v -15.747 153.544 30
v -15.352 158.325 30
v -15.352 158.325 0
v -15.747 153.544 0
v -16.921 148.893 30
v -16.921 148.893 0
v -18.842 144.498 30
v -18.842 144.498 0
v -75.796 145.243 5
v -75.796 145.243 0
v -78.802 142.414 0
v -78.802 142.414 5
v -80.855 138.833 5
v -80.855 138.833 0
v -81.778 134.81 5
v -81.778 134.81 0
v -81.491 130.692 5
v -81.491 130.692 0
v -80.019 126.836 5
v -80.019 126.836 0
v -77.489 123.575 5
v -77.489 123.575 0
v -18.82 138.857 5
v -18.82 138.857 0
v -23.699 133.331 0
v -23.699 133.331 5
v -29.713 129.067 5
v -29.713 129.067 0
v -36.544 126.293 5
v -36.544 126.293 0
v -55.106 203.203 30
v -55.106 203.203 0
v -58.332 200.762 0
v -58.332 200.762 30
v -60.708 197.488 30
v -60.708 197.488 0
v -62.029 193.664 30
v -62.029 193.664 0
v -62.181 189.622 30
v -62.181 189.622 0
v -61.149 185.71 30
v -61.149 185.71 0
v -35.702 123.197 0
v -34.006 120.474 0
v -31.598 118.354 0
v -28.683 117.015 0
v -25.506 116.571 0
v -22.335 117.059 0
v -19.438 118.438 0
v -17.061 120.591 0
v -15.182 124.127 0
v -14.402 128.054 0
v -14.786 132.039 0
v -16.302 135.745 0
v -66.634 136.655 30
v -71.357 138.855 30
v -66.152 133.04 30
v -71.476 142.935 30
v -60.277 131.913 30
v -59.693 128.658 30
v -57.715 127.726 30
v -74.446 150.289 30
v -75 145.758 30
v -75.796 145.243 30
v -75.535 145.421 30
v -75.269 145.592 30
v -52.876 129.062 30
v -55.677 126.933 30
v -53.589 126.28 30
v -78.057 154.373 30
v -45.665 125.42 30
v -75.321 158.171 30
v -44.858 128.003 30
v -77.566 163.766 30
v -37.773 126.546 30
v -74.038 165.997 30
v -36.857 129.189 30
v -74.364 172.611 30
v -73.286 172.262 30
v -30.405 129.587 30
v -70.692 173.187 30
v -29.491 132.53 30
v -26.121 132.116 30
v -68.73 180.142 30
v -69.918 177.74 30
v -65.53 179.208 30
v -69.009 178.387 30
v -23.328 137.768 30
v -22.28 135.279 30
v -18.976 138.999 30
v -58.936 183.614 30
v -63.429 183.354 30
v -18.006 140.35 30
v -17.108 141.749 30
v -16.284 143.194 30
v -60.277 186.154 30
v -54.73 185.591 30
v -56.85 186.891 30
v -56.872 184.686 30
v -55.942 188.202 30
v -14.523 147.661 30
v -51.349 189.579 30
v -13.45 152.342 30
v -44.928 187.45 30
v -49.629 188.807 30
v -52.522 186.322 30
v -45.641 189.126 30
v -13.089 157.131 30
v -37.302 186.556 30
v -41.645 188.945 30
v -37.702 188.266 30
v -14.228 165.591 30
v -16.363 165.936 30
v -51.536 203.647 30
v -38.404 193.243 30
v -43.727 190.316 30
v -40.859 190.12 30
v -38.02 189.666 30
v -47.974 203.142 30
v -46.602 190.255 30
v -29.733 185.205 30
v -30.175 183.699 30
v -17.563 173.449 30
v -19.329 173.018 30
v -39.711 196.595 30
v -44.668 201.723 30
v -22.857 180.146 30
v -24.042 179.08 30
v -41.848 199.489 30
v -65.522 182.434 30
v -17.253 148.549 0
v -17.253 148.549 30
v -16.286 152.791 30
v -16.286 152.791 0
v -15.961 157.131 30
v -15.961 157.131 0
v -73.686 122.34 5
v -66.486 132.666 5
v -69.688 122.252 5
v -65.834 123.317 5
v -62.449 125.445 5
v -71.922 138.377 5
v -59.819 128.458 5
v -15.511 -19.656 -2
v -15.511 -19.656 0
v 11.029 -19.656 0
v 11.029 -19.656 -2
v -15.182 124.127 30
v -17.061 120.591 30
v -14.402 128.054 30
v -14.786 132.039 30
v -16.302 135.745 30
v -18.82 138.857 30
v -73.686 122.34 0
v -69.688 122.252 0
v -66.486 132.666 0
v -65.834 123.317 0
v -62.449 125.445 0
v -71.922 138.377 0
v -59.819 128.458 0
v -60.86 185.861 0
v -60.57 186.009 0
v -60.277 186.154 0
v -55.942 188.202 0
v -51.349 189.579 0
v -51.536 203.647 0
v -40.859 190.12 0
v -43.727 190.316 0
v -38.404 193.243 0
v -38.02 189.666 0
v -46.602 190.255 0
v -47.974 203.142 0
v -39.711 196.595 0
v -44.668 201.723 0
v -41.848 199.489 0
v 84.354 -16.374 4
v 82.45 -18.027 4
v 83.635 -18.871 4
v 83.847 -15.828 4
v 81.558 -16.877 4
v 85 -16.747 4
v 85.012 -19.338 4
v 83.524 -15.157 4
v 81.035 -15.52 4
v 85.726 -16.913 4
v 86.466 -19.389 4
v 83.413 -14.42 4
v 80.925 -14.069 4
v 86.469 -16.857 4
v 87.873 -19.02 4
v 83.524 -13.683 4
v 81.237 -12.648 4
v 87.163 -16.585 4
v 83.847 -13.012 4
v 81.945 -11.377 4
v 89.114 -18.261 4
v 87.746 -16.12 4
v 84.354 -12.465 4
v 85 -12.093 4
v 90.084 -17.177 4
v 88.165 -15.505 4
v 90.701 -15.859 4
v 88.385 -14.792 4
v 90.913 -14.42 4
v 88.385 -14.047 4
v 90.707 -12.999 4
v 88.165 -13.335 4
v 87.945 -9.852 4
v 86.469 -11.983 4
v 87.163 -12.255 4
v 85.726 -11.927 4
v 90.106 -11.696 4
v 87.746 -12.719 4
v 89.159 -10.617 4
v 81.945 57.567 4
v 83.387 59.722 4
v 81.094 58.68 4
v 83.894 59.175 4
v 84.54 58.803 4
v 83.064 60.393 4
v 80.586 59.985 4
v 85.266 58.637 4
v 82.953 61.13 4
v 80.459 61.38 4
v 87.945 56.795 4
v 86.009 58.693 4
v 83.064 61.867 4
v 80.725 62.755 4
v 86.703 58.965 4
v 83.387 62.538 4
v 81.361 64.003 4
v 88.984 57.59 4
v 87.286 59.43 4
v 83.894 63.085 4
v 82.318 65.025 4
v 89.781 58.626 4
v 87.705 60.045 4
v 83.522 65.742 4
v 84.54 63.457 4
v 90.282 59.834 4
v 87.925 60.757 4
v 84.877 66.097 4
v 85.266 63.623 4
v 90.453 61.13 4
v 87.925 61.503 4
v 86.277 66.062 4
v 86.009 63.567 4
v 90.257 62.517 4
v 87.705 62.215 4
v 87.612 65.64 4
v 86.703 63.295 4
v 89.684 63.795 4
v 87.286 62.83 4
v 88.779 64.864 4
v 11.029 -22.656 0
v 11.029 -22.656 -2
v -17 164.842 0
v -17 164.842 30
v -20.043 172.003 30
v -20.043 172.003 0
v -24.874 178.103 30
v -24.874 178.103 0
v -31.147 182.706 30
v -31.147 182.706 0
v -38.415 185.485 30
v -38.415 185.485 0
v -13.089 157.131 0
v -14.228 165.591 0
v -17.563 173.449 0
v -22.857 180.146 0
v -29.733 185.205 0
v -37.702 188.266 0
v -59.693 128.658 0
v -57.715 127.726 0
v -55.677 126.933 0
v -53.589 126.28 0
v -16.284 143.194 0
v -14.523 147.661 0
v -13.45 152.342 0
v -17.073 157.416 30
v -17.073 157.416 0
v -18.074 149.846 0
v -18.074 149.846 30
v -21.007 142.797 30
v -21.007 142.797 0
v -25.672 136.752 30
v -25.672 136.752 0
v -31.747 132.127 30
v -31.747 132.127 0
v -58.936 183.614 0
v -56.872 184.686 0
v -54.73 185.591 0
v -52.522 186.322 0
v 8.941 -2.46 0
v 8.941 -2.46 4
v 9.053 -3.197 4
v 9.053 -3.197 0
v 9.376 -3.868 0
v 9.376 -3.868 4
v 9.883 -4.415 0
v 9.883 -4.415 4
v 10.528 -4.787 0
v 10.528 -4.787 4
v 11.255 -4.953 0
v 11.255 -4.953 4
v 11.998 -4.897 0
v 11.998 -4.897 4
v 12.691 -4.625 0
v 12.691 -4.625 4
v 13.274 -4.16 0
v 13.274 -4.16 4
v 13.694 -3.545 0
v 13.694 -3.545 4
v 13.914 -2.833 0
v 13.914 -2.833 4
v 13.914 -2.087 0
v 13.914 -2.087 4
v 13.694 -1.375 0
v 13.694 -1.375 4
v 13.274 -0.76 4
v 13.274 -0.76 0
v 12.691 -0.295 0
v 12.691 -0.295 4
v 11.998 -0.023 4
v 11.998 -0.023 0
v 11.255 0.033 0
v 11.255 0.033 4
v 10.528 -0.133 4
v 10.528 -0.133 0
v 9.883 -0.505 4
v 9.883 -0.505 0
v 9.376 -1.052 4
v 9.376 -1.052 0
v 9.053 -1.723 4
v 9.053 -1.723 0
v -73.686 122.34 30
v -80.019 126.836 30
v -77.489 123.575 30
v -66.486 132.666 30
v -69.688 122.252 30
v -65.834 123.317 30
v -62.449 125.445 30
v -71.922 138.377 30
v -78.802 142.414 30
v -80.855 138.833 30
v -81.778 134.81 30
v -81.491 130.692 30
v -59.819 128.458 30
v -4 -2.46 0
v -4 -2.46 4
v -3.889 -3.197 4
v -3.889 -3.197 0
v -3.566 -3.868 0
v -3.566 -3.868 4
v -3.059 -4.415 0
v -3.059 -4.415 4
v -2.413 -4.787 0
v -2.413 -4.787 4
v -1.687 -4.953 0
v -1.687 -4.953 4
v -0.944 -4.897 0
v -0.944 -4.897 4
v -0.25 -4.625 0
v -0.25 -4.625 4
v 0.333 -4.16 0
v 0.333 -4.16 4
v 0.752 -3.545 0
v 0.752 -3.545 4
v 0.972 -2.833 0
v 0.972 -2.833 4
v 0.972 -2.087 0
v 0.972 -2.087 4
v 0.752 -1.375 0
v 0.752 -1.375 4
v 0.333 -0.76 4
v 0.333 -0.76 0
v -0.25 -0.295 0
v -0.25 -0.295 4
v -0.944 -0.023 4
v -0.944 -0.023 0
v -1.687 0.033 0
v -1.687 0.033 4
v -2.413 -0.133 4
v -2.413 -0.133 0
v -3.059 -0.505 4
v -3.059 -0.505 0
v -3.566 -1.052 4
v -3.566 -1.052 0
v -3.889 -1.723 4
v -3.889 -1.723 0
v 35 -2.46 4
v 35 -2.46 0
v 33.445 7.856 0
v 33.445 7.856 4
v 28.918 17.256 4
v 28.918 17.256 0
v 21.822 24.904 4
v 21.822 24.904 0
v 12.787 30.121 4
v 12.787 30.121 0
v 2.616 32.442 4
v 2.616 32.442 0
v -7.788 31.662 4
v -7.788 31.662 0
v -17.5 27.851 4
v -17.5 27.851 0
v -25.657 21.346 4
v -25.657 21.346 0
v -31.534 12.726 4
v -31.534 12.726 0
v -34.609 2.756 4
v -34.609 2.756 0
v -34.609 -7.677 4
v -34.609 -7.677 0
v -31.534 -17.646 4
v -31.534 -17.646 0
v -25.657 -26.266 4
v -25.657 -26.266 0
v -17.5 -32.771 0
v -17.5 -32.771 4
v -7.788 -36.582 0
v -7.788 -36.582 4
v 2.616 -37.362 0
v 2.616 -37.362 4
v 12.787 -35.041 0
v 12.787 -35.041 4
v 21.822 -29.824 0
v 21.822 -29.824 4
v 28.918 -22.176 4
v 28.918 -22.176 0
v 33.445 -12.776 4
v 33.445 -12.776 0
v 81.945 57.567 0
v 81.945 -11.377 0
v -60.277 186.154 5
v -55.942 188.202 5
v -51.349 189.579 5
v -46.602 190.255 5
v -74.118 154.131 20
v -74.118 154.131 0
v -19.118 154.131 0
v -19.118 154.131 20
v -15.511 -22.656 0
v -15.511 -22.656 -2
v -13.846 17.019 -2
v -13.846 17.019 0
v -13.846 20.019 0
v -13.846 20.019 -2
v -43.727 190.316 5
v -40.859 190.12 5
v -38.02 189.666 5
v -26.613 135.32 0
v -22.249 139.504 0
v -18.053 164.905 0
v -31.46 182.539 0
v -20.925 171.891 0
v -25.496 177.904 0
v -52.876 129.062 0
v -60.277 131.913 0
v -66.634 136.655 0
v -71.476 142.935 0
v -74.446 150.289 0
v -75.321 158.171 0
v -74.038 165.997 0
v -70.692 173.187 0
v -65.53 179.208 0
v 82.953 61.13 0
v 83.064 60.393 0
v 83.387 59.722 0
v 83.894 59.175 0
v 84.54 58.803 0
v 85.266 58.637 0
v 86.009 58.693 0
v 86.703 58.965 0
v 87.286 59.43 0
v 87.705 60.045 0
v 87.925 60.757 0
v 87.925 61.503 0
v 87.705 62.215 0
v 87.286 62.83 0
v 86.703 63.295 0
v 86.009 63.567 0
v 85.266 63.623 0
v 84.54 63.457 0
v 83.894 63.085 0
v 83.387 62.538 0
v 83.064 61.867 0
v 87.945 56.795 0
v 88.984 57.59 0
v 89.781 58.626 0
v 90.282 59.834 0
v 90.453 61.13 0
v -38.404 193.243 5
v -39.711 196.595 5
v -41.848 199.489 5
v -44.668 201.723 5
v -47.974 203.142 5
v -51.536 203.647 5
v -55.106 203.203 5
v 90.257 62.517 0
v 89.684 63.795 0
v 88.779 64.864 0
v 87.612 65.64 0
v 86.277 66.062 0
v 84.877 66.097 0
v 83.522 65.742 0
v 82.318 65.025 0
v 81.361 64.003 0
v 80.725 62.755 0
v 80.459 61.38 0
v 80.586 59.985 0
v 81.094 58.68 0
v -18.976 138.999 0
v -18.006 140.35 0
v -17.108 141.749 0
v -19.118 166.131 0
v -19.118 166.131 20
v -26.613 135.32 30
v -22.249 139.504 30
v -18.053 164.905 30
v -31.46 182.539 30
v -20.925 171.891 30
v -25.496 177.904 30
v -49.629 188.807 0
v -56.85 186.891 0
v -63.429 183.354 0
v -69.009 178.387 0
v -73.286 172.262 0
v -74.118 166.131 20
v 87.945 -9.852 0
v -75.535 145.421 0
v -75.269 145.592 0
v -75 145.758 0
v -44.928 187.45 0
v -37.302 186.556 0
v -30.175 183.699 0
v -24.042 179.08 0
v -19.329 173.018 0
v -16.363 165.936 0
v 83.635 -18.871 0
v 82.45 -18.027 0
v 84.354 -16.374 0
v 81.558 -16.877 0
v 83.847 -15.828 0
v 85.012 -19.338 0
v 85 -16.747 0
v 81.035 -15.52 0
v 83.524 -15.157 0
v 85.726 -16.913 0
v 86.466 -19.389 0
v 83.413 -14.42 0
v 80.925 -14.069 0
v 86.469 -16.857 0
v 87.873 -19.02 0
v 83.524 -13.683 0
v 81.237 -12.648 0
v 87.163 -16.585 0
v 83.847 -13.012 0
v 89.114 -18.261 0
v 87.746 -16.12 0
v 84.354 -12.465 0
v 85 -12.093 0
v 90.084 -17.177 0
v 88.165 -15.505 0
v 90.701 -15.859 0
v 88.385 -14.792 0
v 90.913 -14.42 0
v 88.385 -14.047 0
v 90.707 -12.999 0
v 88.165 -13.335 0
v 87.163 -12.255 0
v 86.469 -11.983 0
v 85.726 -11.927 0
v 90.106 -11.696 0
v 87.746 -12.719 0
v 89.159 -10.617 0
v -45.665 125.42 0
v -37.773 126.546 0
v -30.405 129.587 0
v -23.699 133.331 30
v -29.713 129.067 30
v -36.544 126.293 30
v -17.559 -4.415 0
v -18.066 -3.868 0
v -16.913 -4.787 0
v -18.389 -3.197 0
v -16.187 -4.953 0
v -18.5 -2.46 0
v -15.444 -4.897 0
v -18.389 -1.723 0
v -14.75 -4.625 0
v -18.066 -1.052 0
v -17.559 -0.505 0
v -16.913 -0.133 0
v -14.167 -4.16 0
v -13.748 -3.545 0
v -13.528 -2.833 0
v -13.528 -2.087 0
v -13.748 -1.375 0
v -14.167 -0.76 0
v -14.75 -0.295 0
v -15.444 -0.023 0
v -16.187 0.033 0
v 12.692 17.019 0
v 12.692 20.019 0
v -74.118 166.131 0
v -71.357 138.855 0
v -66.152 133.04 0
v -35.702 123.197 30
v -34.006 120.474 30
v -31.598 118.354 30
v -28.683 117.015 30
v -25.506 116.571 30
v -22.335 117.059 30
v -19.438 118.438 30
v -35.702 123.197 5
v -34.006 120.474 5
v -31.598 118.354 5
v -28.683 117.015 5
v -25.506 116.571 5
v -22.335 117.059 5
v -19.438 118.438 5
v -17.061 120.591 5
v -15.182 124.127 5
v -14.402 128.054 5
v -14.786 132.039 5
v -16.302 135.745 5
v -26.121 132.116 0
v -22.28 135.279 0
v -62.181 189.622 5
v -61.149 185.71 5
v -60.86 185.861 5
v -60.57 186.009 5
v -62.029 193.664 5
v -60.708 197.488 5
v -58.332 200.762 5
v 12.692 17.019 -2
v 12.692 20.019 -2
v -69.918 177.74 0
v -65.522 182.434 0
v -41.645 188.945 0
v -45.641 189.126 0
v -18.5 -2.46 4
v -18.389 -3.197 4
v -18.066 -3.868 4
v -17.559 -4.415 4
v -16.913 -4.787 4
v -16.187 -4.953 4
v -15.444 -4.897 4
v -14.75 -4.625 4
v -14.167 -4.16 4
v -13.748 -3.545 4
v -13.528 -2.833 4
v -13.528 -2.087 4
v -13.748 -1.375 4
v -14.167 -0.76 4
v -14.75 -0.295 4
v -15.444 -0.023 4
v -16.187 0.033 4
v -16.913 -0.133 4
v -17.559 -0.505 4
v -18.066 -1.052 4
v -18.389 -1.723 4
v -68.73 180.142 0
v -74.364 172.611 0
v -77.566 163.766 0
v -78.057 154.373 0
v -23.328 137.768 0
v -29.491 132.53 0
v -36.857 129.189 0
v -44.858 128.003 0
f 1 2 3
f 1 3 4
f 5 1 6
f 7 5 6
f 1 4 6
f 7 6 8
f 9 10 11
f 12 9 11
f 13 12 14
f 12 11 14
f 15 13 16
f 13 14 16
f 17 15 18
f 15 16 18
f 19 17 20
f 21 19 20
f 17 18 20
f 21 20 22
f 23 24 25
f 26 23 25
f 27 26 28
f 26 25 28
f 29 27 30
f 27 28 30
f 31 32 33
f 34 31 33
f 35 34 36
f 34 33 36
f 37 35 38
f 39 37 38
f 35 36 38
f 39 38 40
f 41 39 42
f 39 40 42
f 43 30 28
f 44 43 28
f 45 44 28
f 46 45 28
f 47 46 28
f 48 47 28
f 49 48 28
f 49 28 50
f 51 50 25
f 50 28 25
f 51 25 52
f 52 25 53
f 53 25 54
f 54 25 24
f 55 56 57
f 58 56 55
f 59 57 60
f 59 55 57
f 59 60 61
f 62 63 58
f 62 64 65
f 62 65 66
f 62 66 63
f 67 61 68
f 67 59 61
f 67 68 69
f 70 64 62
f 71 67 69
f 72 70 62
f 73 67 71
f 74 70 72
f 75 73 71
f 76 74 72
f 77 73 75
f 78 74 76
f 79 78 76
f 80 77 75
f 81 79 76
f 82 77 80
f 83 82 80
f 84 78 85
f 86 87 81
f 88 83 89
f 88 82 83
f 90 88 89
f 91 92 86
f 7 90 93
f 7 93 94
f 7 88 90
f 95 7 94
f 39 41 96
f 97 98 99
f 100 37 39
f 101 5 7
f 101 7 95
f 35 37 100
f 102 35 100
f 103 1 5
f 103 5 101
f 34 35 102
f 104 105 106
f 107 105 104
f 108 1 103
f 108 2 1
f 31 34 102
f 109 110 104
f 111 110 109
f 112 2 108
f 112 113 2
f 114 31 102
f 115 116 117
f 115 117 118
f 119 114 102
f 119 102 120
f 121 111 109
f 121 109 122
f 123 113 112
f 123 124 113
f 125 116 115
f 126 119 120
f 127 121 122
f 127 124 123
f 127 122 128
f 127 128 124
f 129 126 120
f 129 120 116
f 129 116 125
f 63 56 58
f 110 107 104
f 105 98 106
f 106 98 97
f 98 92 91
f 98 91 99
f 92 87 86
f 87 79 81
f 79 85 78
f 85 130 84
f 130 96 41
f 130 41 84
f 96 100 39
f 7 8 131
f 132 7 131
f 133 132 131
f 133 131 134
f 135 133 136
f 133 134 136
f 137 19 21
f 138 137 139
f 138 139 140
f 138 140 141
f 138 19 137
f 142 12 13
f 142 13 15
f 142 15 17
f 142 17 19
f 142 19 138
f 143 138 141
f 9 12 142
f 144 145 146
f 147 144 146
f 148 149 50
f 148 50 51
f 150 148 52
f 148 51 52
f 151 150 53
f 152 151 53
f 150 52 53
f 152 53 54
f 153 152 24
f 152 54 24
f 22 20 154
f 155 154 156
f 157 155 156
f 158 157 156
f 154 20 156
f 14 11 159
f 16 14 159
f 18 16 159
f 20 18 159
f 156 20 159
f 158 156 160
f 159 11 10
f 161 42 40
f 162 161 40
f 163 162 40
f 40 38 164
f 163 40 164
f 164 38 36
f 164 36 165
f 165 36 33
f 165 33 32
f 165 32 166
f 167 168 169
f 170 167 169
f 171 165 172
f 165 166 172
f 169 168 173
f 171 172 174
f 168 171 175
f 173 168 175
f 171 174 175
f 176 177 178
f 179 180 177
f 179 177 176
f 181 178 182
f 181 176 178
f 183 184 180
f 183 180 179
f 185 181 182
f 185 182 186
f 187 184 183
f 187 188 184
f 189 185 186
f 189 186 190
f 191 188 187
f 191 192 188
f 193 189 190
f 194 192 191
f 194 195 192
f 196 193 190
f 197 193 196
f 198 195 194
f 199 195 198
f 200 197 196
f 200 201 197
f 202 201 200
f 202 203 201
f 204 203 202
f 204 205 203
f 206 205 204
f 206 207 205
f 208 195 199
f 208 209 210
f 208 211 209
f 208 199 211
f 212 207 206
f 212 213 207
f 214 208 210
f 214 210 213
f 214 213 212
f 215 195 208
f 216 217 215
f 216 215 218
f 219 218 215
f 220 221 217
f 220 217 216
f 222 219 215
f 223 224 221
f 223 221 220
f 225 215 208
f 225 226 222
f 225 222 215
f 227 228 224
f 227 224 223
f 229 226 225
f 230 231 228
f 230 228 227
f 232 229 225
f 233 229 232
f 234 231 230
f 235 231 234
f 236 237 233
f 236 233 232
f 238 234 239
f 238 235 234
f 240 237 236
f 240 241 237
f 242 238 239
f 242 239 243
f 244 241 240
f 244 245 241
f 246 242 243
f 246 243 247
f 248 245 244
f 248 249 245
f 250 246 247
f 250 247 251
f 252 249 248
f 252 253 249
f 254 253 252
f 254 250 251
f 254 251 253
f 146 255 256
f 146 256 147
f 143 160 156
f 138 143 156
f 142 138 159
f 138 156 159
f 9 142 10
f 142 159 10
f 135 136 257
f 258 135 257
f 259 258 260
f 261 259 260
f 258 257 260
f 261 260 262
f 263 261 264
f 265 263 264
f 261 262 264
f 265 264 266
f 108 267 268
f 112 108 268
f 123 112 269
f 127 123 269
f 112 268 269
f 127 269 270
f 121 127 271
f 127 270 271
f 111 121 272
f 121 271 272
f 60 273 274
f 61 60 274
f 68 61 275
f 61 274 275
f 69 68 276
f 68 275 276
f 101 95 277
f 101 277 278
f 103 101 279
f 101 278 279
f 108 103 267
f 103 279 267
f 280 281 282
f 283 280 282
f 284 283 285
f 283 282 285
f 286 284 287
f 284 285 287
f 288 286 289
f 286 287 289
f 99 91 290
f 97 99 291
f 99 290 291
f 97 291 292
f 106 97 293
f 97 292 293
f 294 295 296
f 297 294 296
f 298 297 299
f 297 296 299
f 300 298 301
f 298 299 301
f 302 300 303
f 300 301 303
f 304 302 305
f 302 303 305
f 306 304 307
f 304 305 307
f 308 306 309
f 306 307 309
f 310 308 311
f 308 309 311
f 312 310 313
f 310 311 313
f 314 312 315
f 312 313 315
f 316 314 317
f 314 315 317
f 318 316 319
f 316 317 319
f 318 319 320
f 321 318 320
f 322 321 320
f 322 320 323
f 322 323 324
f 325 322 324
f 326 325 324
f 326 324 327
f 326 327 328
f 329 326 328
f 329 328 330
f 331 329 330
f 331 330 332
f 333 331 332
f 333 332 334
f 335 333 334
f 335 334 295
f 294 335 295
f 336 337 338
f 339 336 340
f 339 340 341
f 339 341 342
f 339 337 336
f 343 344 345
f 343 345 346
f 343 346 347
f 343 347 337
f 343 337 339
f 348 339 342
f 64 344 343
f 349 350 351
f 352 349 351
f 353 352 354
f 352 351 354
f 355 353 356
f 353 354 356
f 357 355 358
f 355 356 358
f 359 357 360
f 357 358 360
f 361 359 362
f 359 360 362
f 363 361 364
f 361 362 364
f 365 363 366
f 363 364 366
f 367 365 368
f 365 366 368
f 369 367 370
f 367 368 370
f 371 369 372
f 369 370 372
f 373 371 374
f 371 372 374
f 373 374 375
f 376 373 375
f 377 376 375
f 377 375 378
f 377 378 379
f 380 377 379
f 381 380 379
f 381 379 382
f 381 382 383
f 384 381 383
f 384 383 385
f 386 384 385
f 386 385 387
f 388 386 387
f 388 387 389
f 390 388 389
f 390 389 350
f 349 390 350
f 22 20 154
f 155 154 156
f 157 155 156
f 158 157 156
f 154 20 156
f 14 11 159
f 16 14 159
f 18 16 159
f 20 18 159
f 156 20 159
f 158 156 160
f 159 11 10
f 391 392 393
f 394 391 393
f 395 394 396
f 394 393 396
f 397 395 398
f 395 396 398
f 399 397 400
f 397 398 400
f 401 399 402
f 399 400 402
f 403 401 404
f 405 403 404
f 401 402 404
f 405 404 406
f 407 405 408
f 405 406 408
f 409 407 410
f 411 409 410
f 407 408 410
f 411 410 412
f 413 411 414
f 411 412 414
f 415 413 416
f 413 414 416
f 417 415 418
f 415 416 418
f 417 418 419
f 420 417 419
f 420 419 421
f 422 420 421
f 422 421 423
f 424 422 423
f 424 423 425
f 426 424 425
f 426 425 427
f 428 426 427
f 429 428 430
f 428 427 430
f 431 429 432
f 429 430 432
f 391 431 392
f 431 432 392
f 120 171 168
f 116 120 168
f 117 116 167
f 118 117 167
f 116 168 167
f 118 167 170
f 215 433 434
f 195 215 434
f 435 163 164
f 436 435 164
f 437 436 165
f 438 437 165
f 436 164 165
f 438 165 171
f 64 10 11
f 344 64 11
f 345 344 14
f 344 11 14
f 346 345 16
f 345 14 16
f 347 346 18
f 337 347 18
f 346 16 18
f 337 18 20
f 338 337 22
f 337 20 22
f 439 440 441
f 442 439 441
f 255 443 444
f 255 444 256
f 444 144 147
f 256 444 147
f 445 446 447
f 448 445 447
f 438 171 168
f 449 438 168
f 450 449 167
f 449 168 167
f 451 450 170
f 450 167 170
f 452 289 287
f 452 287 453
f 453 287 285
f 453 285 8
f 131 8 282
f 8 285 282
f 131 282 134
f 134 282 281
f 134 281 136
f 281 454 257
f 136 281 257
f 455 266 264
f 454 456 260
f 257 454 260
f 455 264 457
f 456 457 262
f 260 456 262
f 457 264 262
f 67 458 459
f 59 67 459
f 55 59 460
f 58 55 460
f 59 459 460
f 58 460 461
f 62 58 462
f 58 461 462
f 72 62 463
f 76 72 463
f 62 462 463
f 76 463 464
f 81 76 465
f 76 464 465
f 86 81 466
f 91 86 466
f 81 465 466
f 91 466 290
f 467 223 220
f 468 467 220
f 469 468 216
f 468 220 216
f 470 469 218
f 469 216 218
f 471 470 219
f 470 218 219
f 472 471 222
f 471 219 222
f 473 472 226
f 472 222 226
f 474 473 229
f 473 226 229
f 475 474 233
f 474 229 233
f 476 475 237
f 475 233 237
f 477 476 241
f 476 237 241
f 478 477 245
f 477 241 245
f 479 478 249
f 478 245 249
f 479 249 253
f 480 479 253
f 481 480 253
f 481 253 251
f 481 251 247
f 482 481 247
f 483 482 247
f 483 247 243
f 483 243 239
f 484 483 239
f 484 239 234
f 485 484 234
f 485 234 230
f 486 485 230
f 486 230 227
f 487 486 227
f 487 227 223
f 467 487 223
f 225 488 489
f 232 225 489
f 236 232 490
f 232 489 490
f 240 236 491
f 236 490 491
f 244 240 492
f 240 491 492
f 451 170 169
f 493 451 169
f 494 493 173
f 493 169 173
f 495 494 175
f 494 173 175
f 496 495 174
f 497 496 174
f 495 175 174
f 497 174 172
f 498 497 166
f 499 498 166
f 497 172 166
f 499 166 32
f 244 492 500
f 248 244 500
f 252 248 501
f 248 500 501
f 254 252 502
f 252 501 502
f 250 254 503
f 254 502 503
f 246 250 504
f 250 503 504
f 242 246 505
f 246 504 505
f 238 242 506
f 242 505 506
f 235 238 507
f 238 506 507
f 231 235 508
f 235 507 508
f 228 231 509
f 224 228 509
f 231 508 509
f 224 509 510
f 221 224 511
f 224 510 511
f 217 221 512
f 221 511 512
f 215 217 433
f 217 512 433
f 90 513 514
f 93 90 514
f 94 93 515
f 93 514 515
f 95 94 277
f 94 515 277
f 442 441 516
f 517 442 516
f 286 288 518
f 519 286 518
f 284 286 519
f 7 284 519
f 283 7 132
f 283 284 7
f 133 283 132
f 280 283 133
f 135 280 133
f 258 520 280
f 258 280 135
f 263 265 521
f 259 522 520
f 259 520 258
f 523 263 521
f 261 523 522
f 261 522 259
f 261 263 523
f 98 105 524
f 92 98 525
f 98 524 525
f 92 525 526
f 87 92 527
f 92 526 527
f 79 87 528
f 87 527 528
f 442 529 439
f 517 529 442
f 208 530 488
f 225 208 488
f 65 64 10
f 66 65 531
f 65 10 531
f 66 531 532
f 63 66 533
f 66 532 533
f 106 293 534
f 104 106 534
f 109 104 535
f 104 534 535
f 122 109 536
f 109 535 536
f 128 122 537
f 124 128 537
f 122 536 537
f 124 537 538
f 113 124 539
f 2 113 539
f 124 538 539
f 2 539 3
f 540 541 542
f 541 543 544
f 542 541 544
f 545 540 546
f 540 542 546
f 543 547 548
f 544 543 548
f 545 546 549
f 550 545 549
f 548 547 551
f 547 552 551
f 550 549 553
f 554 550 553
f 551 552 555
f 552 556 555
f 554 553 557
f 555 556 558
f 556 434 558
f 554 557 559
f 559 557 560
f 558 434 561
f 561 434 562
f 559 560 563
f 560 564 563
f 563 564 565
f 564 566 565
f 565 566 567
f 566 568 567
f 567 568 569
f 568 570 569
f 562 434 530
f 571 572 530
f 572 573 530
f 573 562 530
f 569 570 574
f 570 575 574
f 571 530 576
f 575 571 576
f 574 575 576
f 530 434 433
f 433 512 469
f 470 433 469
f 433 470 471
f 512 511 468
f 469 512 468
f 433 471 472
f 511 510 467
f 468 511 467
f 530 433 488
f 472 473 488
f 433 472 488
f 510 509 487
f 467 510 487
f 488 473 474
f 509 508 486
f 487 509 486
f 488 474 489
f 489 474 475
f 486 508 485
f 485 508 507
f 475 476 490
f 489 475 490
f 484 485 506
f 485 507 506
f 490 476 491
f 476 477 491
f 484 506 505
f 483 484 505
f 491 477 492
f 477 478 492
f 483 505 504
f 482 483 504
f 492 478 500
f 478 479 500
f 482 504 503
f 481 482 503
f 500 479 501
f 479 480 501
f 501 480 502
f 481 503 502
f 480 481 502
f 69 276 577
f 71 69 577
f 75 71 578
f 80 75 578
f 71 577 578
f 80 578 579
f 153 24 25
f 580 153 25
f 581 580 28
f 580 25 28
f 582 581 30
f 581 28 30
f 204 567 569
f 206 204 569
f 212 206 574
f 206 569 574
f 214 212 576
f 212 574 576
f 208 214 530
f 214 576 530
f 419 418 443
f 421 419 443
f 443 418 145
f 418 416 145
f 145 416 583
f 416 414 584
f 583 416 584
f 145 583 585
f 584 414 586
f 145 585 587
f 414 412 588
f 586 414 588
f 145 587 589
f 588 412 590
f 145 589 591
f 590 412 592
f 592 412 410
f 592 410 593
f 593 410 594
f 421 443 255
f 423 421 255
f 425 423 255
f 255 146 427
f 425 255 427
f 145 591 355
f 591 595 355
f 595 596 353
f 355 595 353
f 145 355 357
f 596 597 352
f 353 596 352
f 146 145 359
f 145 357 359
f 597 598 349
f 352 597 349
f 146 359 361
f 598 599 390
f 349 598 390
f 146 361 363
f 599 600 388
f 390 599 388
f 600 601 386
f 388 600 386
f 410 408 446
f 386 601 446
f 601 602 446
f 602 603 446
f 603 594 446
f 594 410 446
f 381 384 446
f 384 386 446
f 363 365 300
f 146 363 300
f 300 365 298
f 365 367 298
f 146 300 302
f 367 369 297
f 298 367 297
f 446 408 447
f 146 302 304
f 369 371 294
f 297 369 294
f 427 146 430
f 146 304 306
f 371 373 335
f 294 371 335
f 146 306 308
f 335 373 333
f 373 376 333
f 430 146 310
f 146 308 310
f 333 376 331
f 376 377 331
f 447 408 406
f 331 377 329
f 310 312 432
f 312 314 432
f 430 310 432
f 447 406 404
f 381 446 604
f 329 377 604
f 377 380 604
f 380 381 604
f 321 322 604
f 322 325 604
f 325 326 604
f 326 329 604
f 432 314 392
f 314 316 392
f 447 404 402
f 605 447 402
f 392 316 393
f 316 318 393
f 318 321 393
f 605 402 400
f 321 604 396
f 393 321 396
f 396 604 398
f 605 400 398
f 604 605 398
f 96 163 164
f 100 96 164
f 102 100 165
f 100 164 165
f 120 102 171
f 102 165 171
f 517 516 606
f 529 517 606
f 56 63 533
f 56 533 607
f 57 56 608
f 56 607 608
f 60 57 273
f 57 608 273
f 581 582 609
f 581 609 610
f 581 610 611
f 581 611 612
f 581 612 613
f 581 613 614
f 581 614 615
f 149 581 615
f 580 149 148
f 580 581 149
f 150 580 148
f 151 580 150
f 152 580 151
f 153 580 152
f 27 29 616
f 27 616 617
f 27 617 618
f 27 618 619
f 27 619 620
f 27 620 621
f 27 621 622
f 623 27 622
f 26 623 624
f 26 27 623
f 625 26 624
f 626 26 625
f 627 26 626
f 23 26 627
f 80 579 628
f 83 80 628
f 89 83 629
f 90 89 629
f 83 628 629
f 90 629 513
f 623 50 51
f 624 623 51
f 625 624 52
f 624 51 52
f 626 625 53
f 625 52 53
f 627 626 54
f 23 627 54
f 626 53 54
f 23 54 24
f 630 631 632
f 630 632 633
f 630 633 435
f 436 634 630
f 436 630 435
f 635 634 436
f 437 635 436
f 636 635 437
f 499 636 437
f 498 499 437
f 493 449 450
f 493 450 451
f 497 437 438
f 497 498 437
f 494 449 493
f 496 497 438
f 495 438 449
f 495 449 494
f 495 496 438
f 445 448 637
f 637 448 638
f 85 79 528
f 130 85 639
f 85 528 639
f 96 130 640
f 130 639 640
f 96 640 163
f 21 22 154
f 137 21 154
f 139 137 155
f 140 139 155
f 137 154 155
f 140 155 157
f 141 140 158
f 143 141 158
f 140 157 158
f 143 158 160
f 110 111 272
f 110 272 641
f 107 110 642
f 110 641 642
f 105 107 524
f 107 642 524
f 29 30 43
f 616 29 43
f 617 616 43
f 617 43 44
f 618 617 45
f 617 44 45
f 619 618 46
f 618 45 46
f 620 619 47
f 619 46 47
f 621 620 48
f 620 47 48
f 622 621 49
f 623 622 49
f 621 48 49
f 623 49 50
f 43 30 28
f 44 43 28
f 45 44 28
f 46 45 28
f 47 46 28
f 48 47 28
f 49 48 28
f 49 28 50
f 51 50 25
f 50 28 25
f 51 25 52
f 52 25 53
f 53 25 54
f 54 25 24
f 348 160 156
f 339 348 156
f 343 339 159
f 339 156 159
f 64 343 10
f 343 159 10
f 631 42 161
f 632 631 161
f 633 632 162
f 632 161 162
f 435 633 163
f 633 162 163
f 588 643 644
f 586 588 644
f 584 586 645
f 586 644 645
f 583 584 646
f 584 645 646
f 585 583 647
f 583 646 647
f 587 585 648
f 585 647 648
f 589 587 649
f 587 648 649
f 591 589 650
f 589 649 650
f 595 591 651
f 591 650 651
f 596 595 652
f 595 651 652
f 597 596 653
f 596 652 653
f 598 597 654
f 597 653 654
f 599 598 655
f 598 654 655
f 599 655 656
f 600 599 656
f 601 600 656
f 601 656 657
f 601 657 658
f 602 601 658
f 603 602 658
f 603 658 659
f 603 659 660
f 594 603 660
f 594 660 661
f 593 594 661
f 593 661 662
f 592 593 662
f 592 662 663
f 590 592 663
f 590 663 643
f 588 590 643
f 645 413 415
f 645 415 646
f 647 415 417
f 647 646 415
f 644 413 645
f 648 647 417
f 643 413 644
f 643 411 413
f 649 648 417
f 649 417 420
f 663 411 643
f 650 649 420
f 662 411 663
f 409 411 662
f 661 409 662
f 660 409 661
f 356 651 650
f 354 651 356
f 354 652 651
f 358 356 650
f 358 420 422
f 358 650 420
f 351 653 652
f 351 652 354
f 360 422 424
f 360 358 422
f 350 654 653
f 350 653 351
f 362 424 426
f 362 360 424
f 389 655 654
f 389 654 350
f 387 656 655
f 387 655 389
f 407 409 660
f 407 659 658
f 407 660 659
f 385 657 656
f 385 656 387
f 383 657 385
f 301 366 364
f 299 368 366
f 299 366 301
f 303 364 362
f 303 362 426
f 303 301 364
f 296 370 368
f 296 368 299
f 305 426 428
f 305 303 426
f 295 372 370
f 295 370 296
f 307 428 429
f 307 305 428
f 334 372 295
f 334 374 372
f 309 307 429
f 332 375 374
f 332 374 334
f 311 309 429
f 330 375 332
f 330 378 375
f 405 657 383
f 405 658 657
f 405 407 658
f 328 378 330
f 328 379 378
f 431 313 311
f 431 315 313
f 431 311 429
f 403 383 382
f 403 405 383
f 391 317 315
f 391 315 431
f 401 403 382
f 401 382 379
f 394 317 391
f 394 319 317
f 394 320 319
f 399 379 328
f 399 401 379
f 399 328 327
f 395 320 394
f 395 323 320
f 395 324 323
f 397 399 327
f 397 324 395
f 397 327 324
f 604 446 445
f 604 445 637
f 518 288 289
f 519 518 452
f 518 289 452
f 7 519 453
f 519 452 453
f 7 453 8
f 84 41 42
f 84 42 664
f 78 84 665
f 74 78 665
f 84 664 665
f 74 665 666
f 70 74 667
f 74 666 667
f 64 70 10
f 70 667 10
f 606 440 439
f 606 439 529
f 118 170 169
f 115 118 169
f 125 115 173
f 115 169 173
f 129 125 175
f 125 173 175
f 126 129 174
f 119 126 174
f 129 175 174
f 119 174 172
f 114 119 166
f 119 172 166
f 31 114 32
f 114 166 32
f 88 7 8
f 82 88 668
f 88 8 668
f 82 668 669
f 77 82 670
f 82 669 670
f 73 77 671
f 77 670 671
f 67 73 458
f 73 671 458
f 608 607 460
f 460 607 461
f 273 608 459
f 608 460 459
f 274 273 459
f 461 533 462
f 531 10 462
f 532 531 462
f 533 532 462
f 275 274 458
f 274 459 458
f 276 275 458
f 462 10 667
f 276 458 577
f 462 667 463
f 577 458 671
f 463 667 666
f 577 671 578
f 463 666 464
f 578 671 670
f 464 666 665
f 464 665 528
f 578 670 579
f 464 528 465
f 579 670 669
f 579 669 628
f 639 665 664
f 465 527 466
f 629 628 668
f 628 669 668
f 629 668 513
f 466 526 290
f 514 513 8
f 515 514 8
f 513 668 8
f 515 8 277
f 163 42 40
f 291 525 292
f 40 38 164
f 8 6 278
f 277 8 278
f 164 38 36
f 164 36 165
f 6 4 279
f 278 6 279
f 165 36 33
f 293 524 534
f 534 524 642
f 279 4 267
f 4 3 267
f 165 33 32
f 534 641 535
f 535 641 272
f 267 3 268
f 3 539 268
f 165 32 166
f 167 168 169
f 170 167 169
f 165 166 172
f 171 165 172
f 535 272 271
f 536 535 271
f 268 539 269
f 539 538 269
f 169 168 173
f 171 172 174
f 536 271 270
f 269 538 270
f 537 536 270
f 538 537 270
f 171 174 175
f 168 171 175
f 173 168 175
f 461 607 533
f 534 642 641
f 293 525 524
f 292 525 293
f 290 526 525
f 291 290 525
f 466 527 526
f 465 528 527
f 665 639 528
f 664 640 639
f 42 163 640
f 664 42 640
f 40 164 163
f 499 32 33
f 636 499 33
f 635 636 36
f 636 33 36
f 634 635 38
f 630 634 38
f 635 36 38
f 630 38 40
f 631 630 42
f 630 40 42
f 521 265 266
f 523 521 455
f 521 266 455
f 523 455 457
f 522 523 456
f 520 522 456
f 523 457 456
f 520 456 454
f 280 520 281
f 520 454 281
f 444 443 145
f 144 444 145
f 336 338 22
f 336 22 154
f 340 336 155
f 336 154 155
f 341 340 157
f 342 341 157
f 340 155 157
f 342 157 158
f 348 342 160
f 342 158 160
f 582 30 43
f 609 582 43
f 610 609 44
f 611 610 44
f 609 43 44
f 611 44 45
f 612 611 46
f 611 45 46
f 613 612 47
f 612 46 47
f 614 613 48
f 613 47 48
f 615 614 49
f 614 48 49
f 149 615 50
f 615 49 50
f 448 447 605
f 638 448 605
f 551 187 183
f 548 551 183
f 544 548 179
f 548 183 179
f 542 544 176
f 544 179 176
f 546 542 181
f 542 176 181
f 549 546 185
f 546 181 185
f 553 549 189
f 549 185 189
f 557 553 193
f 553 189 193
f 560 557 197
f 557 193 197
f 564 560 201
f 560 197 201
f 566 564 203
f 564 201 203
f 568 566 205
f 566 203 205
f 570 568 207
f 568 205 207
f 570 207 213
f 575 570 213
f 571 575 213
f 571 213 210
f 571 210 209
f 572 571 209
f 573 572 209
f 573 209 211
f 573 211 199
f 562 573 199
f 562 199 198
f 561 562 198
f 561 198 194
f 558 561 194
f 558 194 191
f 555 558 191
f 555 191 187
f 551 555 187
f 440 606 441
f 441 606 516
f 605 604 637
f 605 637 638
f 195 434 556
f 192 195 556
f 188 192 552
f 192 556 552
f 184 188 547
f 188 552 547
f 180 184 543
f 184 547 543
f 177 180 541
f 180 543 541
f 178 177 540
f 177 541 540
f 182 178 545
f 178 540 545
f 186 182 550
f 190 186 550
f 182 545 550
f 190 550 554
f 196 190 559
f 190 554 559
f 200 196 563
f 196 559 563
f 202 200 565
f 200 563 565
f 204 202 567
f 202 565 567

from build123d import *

# Parameters (mm, degrees)
F0_R      = 35
F0_W      = 26.54
F0_H      = 3
F0_R_2    = 1.5
F0_R_3    = 3
F0_W_2    = 26.5384623781
F1_DEPTH  = 4
F2_DEPTH  = 2
F3_D      = 5
F5_DEPTH  = 4
F6_D      = 5
F7_W      = 2
F7_H      = 65
F8_DEPTH  = 3
F10_DEPTH = 30
F11_DEPTH = 5
F12_W     = 42.6740131952
F12_H     = 12
F12_W_2   = 12.3259868048
F13_DEPTH = 20


with BuildPart() as f1:
    # F0 (on Top) → F1 (new body)
    with BuildSketch(Plane.XY):
        with Locations((0, -2.4600220768)):
            Circle(F0_R)
        with Locations((-2.2411635104, -21.1555075496)):
            Rectangle(F0_W, F0_H, mode=Mode.SUBTRACT)
        with Locations((-16, -2.4600220768)):
            Circle(F0_R_2, mode=Mode.SUBTRACT)
        with Locations((-1.5, -2.4600220768)):
            Circle(F0_R_3, mode=Mode.SUBTRACT)
        with Locations((-0.5769231357, 18.5192308724)):
            Rectangle(F0_W_2, F0_H, mode=Mode.SUBTRACT)
        with Locations((11.4414943382, -2.4600220768)):
            Circle(F0_R_2, mode=Mode.SUBTRACT)
        with Locations((-2.2411635104, -21.1555075496)):
            Rectangle(F0_W, F0_H)
        with Locations((-0.5769231357, 18.5192308724)):
            Rectangle(F0_W_2, F0_H)
        with Locations((-1.5, -2.4600220768)):
            Circle(F0_R_3)
        with Locations((11.4414943382, -2.4600220768)):
            Circle(F0_R_2)
        with Locations((-16, -2.4600220768)):
            Circle(F0_R_2)
    extrude(amount=F1_DEPTH)

    # F0 (on Top) → F2 (join)
    with BuildSketch(Plane.XY):
        with Locations((-2.2411635104, -21.1555075496)):
            Rectangle(F0_W, F0_H)
        with Locations((-0.5769231357, 18.5192308724)):
            Rectangle(F0_W_2, F0_H)
    extrude(amount=-F2_DEPTH)

    # F3 (through all)
    with Locations(Plane(origin=(0, 0, 0), x_dir=(1, 0, 0), z_dir=(0, 0, -1))):
        with Locations((-1.5, 2.4600220768), (11.4414943382, 2.4600220768), (-16, 2.4600220768)):
            Hole(F3_D / 2)


with BuildPart() as f5:
    # F4 (on Top) → F5 (new body)
    with BuildSketch(Plane.XY):
        with BuildLine():
            ThreePointArc((87.9450732429, 56.7952425036), (89.7808805629, 58.6259806462), (90.4530596292, 61.1299706553))
            ThreePointArc((90.4530596292, 61.1299706553), (83.5217300265, 65.7419079885), (81.9450732429, 57.5671022163))
            Line((81.9450732429, 57.5671022163), (87.9450732429, 57.5671022163))
            Line((87.9450732429, 57.5671022163), (87.9450732429, 56.7952425036))
        make_face()
        with BuildLine():
            Line((81.9450732429, -12.4328977837), (81.9450732429, -11.3774370589))
            ThreePointArc((81.9450732429, -11.3774370589), (84.3064843691, -19.1548178593), (90.9128758311, -14.4198937342))
            ThreePointArc((90.9128758311, -14.4198937342), (90.105785743, -11.6960166315), (87.9450732429, -9.8515052131))
            Line((87.9450732429, -9.8515052131), (87.9450732429, -12.4328977837))
            Line((87.9450732429, -12.4328977837), (81.9450732429, -12.4328977837))
        make_face()
        with BuildLine():
            ThreePointArc((87.9450732429, 56.7952425036), (84.8151003651, 56.1708368622), (81.9450732429, 57.5671022163))
            Line((81.9450732429, 57.5671022163), (81.9450732429, -11.3774370589))
            ThreePointArc((81.9450732429, -11.3774370589), (84.6804964864, -9.5741490906), (87.9450732429, -9.8515052131))
            Line((87.9450732429, -9.8515052131), (87.9450732429, 56.7952425036))
        make_face()
        with BuildLine():
            Line((87.9450732429, 57.5671022163), (81.9450732429, 57.5671022163))
            ThreePointArc((81.9450732429, 57.5671022163), (84.8151003651, 56.1708368622), (87.9450732429, 56.7952425036))
            Line((87.9450732429, 56.7952425036), (87.9450732429, 57.5671022163))
        make_face()
        with BuildLine():
            ThreePointArc((87.9450732429, -9.8515052131), (84.6804964864, -9.5741490906), (81.9450732429, -11.3774370589))
            Line((81.9450732429, -11.3774370589), (81.9450732429, -12.4328977837))
            Line((81.9450732429, -12.4328977837), (87.9450732429, -12.4328977837))
            Line((87.9450732429, -12.4328977837), (87.9450732429, -9.8515052131))
        make_face()
    extrude(amount=F5_DEPTH)

    # F6 (through all)
    with Locations(Plane(origin=(0, 0, 0), x_dir=(1, 0, 0), z_dir=(0, 0, -1))):
        with Locations((85.4530596292, -61.1299706553), (85.9128758311, 14.4198937342)):
            Hole(F6_D / 2)

    # F7 (on Top) → F8 (join)
    with BuildSketch(Plane.XY):
        with Locations((83.2414569196, 23.0664638802)):
            Rectangle(F7_W, F7_H)
    extrude(amount=F8_DEPTH)


with BuildPart() as f10:
    # F9 (on Top) → F10 (new body)
    with BuildSketch(Plane.XY):
        with BuildLine():
            ThreePointArc((-73.2858614672, 172.2622414718), (-77.0227304851, 159.1962191884), (-75.000224512, 145.7576702356))
            ThreePointArc((-75.000224512, 145.7576702356), (-68.9325789571, 135.7881382146), (-59.6934286842, 128.657500548))
            ThreePointArc((-59.6934286842, 128.657500548), (-56.7023361178, 127.3122486294), (-53.5892591718, 126.2802169468))
            ThreePointArc((-53.5892591718, 126.2802169468), (-41.6838663684, 125.7364505743), (-30.4051696922, 129.586783152))
            ThreePointArc((-30.4051696922, 129.586783152), (-67.0534721321, 135.6434181391), (-73.2858614672, 172.2622414718))
        make_face()
        with BuildLine():
            ThreePointArc((-75.7963746055, 145.2431060979), (-75.4026441809, 145.5071103051), (-75.000224512, 145.7576702356))
            ThreePointArc((-75.000224512, 145.7576702356), (-77.0227304851, 159.1962191884), (-73.2858614672, 172.2622414718))
            ThreePointArc((-73.2858614672, 172.2622414718), (-67.8382371628, 180.1976664827), (-60.2772855271, 186.1541411976))
            ThreePointArc((-60.2772855271, 186.1541411976), (-60.7150688845, 185.9355609592), (-61.1494588106, 185.7103122505))
            ThreePointArc((-61.1494588106, 185.7103122505), (-76.291754107, 168.3067007621), (-75.7963746055, 145.2431060979))
        make_face()
        with BuildLine():
            ThreePointArc((-61.1494588106, 185.7103122505), (-60.7150688845, 185.9355609592), (-60.2772855271, 186.1541411976))
            ThreePointArc((-60.2772855271, 186.1541411976), (-53.6710172386, 188.9768439079), (-46.6015343342, 190.2546712658))
            ThreePointArc((-46.6015343342, 190.2546712658), (-42.2911393785, 190.2500726443), (-38.0204665002, 189.6662242149))
            ThreePointArc((-38.0204665002, 189.6662242149), (-43.1839698715, 200.6995796457), (-55.105868423, 203.2025846503))
            ThreePointArc((-55.105868423, 203.2025846503), (-61.5099400927, 195.6250269593), (-61.1494588106, 185.7103122505))
        make_face()
        with BuildLine():
            ThreePointArc((-14.2020561308, 157.4158754629), (-18.5479392037, 141.3146389581), (-30.4051696922, 129.586783152))
            ThreePointArc((-30.4051696922, 129.586783152), (-24.1386129674, 133.6225846899), (-18.9757059518, 138.9986258344))
            ThreePointArc((-18.9757059518, 138.9986258344), (-17.5480549257, 141.0435895186), (-16.2839985307, 143.1935256462))
            ThreePointArc((-16.2839985307, 143.1935256462), (-13.8983179669, 149.9814104366), (-13.0894609094, 157.1307182312))
            ThreePointArc((-13.0894609094, 157.1307182312), (-19.9857709683, 176.9752326204), (-37.7022578684, 188.2663767473))
            ThreePointArc((-37.7022578684, 188.2663767473), (-20.7462754081, 176.806678123), (-14.2020561308, 157.4158754629))
        make_face()
        with BuildLine():
            ThreePointArc((-49.6290874558, 188.807078357), (-63.4291657743, 183.3538993019), (-73.2858614672, 172.2622414718))
            ThreePointArc((-73.2858614672, 172.2622414718), (-67.0534721321, 135.6434181391), (-30.4051696922, 129.586783152))
            ThreePointArc((-30.4051696922, 129.586783152), (-18.5479392037, 141.3146389581), (-14.2020561308, 157.4158754629))
            ThreePointArc((-14.2020561308, 157.4158754629), (-20.7462754081, 176.806678123), (-37.7022578684, 188.2663767473))
            ThreePointArc((-37.7022578684, 188.2663767473), (-43.6402326559, 189.0978847849), (-49.6290874558, 188.807078357))
        make_face()
        with BuildLine():
            ThreePointArc((-58.9358602723, 183.613950101), (-55.8102922922, 185.1601453587), (-52.5223529313, 186.3217604982))
            ThreePointArc((-52.5223529313, 186.3217604982), (-26.9556144077, 181.5924252869), (-15.3515665912, 158.3250488867))
            ThreePointArc((-15.3515665912, 158.3250488867), (-16.2377535984, 151.1947011831), (-18.8423936526, 144.4982068783))
            ThreePointArc((-18.8423936526, 144.4982068783), (-33.0576562429, 130.6029109503), (-52.8762957046, 129.0619796323))
            ThreePointArc((-52.8762957046, 129.0619796323), (-75.1528317805, 154.2000595569), (-58.9358602723, 183.613950101))
        make_face(mode=Mode.SUBTRACT)
    extrude(amount=F10_DEPTH)


with BuildPart() as f10b:
    # F9 (on Top) → F10, piece 2 (new body)
    with BuildSketch(Plane.XY):
        with BuildLine():
            ThreePointArc((-59.8194696617, 128.4578705467), (-69.380698862, 135.3534521794), (-75.7963746055, 145.2431060979))
            ThreePointArc((-75.7963746055, 145.2431060979), (-81.7781403803, 134.8101403643), (-77.488720417, 123.5749647021))
            ThreePointArc((-77.488720417, 123.5749647021), (-67.7219692241, 122.6434333215), (-59.8194696617, 128.4578705467))
        make_face()
    extrude(amount=F10_DEPTH)


with BuildPart() as f10c:
    # F9 (on Top) → F10, piece 3 (new body)
    with BuildSketch(Plane.XY):
        with BuildLine():
            ThreePointArc((-18.8199962523, 138.8573707921), (-26.5830521793, 131.0249174215), (-36.5439675777, 126.292843082))
            ThreePointArc((-36.5439675777, 126.292843082), (-28.6830339005, 117.0150793111), (-17.0605052263, 120.5911114812))
            ThreePointArc((-17.0605052263, 120.5911114812), (-14.4483808733, 130.0605942776), (-18.8199962523, 138.8573707921))
        make_face()
    extrude(amount=F10_DEPTH)


with BuildPart() as f10d:
    # F9 (on Top) → F10, piece 4 (new body)
    with BuildSketch(Plane.XY):
        with BuildLine():
            ThreePointArc((-31.746594947, 132.1269742486), (-24.3220064999, 137.2982067343), (-18.8423936526, 144.4982068783))
            ThreePointArc((-18.8423936526, 144.4982068783), (-16.6902064444, 150.6521976828), (-15.960628412, 157.1307182312))
            ThreePointArc((-15.960628412, 157.1307182312), (-22.2541626931, 175.2149112747), (-38.4152213356, 185.4846140618))
            ThreePointArc((-38.4152213356, 185.4846140618), (-23.0146642001, 175.0463529979), (-17.0732236334, 157.4158754629))
            ThreePointArc((-17.0732236334, 157.4158754629), (-21.0072194558, 142.7970831878), (-31.746594947, 132.1269742486))
        make_face()
    extrude(amount=F10_DEPTH)


with BuildPart() as f11:
    # F9 (on Top) → F11 (new body)
    with BuildSketch(Plane.XY):
        with BuildLine():
            ThreePointArc((-59.8194696617, 128.4578705467), (-69.380698862, 135.3534521794), (-75.7963746055, 145.2431060979))
            ThreePointArc((-75.7963746055, 145.2431060979), (-81.7781403803, 134.8101403643), (-77.488720417, 123.5749647021))
            ThreePointArc((-77.488720417, 123.5749647021), (-67.7219692241, 122.6434333215), (-59.8194696617, 128.4578705467))
        make_face()
    extrude(amount=F11_DEPTH)


with BuildPart() as f11b:
    # F9 (on Top) → F11, piece 2 (new body)
    with BuildSketch(Plane.XY):
        with BuildLine():
            ThreePointArc((-18.8199962523, 138.8573707921), (-26.5830521793, 131.0249174215), (-36.5439675777, 126.292843082))
            ThreePointArc((-36.5439675777, 126.292843082), (-28.6830339005, 117.0150793111), (-17.0605052263, 120.5911114812))
            ThreePointArc((-17.0605052263, 120.5911114812), (-14.4483808733, 130.0605942776), (-18.8199962523, 138.8573707921))
        make_face()
    extrude(amount=F11_DEPTH)


with BuildPart() as f11c:
    # F9 (on Top) → F11, piece 3 (new body)
    with BuildSketch(Plane.XY):
        with BuildLine():
            ThreePointArc((-61.1494588106, 185.7103122505), (-60.7150688845, 185.9355609592), (-60.2772855271, 186.1541411976))
            ThreePointArc((-60.2772855271, 186.1541411976), (-53.6710172386, 188.9768439079), (-46.6015343342, 190.2546712658))
            ThreePointArc((-46.6015343342, 190.2546712658), (-42.2911393785, 190.2500726443), (-38.0204665002, 189.6662242149))
            ThreePointArc((-38.0204665002, 189.6662242149), (-43.1839698715, 200.6995796457), (-55.105868423, 203.2025846503))
            ThreePointArc((-55.105868423, 203.2025846503), (-61.5099400927, 195.6250269593), (-61.1494588106, 185.7103122505))
        make_face()
    extrude(amount=F11_DEPTH)


with BuildPart() as f13:
    # F12 (on Top) → F13 (new body)
    with BuildSketch(Plane.XY):
        with Locations((-40.4553000044, 160.1312771357)):
            Rectangle(F12_W, F12_H)
        with Locations((-67.9553000044, 160.1312771357)):
            Rectangle(F12_W_2, F12_H)
    extrude(amount=F13_DEPTH)


solid = Compound([f1.part, f5.part, f10.part, f10b.part, f10c.part, f10d.part, f11.part, f11b.part, f11c.part, f13.part])
